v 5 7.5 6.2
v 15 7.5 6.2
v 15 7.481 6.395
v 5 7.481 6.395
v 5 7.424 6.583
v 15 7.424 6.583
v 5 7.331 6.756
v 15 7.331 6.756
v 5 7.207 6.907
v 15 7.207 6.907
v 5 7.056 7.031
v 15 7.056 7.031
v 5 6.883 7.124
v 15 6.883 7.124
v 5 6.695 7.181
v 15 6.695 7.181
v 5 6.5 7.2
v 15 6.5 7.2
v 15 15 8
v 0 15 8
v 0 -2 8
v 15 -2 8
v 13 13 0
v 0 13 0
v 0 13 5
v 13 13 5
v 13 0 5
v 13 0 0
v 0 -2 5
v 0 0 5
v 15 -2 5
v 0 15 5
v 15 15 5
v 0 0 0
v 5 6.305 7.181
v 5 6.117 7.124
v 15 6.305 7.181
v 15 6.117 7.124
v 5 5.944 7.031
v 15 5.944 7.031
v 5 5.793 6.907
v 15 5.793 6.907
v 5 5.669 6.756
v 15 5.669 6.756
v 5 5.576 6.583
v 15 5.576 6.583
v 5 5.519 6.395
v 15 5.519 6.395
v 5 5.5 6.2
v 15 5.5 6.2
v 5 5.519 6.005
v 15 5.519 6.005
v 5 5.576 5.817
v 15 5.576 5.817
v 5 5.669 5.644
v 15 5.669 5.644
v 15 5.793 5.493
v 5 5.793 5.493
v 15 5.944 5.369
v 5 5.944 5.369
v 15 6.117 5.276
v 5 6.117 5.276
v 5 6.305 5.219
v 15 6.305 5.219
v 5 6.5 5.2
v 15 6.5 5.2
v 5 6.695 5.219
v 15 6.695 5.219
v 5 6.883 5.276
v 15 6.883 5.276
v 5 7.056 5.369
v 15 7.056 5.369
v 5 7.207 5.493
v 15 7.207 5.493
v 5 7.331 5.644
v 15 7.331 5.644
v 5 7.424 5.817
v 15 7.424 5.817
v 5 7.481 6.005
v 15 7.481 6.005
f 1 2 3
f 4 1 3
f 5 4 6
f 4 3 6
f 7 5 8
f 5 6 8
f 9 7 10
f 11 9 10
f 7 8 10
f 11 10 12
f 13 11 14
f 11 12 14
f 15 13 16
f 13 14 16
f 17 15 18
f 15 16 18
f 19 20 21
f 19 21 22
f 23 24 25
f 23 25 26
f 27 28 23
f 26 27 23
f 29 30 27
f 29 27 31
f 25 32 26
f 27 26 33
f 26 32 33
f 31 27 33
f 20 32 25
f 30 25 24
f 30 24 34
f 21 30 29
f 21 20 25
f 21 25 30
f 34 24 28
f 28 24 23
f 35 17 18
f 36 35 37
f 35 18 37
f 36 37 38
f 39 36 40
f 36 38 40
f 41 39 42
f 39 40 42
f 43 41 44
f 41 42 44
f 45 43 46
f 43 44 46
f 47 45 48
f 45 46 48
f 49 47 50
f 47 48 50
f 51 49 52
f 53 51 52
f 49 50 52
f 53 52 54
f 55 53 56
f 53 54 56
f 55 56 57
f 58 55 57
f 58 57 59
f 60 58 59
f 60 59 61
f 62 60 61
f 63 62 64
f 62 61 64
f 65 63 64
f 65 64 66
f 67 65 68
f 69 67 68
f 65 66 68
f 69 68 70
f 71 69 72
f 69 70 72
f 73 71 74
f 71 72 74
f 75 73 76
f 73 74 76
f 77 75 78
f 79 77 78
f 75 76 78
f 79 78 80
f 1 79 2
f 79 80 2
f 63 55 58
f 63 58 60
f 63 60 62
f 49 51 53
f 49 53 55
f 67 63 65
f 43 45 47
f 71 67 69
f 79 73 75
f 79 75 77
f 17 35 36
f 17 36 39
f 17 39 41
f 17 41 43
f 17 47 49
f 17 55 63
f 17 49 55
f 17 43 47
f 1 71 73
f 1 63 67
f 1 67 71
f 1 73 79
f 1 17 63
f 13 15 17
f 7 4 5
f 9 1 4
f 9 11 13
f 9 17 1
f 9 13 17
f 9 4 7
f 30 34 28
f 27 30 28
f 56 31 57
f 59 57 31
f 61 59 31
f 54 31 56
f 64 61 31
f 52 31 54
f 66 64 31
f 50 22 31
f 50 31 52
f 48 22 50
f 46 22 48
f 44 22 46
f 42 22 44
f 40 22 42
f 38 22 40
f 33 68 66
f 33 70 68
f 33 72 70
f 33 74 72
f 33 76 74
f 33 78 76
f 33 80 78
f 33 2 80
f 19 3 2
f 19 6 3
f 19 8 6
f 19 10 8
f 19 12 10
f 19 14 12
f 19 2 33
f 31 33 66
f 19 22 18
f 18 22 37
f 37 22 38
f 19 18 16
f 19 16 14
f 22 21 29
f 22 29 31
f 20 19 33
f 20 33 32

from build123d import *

# Parameters (mm, degrees)
F0_W     = 13
F0_H     = 13
F1_DEPTH = 8
F3_DEPTH = 3
F5_DEPTH = 10


with BuildPart() as f1:
    # F0 (on Top) → F1 (new body)
    with BuildSketch(Plane.XY):
        with Locations((6.5, 6.5)):
            Rectangle(F0_W, F0_H)
    extrude(amount=F1_DEPTH)

    # F2 (on face) → F3 (join)
    with BuildSketch(Plane.XY.offset(8)):
        Polygon((13, 0), (0, 0), (0, -2), (15, -2), (15, 15), (0, 15), (0, 13), (13, 13), align=None)
    extrude(amount=-F3_DEPTH)

    # F4 (on face) → F5 (cut)
    with BuildSketch(Plane.YZ.offset(15)):
        with BuildLine():
            ThreePointArc((7.5, 6.2), (7.207107, 6.907107), (6.5, 7.2))
            ThreePointArc((6.5, 7.2), (5.792893, 5.492893), (7.5, 6.2))
        make_face()
    extrude(amount=-F5_DEPTH, mode=Mode.SUBTRACT)


solid = f1.part
